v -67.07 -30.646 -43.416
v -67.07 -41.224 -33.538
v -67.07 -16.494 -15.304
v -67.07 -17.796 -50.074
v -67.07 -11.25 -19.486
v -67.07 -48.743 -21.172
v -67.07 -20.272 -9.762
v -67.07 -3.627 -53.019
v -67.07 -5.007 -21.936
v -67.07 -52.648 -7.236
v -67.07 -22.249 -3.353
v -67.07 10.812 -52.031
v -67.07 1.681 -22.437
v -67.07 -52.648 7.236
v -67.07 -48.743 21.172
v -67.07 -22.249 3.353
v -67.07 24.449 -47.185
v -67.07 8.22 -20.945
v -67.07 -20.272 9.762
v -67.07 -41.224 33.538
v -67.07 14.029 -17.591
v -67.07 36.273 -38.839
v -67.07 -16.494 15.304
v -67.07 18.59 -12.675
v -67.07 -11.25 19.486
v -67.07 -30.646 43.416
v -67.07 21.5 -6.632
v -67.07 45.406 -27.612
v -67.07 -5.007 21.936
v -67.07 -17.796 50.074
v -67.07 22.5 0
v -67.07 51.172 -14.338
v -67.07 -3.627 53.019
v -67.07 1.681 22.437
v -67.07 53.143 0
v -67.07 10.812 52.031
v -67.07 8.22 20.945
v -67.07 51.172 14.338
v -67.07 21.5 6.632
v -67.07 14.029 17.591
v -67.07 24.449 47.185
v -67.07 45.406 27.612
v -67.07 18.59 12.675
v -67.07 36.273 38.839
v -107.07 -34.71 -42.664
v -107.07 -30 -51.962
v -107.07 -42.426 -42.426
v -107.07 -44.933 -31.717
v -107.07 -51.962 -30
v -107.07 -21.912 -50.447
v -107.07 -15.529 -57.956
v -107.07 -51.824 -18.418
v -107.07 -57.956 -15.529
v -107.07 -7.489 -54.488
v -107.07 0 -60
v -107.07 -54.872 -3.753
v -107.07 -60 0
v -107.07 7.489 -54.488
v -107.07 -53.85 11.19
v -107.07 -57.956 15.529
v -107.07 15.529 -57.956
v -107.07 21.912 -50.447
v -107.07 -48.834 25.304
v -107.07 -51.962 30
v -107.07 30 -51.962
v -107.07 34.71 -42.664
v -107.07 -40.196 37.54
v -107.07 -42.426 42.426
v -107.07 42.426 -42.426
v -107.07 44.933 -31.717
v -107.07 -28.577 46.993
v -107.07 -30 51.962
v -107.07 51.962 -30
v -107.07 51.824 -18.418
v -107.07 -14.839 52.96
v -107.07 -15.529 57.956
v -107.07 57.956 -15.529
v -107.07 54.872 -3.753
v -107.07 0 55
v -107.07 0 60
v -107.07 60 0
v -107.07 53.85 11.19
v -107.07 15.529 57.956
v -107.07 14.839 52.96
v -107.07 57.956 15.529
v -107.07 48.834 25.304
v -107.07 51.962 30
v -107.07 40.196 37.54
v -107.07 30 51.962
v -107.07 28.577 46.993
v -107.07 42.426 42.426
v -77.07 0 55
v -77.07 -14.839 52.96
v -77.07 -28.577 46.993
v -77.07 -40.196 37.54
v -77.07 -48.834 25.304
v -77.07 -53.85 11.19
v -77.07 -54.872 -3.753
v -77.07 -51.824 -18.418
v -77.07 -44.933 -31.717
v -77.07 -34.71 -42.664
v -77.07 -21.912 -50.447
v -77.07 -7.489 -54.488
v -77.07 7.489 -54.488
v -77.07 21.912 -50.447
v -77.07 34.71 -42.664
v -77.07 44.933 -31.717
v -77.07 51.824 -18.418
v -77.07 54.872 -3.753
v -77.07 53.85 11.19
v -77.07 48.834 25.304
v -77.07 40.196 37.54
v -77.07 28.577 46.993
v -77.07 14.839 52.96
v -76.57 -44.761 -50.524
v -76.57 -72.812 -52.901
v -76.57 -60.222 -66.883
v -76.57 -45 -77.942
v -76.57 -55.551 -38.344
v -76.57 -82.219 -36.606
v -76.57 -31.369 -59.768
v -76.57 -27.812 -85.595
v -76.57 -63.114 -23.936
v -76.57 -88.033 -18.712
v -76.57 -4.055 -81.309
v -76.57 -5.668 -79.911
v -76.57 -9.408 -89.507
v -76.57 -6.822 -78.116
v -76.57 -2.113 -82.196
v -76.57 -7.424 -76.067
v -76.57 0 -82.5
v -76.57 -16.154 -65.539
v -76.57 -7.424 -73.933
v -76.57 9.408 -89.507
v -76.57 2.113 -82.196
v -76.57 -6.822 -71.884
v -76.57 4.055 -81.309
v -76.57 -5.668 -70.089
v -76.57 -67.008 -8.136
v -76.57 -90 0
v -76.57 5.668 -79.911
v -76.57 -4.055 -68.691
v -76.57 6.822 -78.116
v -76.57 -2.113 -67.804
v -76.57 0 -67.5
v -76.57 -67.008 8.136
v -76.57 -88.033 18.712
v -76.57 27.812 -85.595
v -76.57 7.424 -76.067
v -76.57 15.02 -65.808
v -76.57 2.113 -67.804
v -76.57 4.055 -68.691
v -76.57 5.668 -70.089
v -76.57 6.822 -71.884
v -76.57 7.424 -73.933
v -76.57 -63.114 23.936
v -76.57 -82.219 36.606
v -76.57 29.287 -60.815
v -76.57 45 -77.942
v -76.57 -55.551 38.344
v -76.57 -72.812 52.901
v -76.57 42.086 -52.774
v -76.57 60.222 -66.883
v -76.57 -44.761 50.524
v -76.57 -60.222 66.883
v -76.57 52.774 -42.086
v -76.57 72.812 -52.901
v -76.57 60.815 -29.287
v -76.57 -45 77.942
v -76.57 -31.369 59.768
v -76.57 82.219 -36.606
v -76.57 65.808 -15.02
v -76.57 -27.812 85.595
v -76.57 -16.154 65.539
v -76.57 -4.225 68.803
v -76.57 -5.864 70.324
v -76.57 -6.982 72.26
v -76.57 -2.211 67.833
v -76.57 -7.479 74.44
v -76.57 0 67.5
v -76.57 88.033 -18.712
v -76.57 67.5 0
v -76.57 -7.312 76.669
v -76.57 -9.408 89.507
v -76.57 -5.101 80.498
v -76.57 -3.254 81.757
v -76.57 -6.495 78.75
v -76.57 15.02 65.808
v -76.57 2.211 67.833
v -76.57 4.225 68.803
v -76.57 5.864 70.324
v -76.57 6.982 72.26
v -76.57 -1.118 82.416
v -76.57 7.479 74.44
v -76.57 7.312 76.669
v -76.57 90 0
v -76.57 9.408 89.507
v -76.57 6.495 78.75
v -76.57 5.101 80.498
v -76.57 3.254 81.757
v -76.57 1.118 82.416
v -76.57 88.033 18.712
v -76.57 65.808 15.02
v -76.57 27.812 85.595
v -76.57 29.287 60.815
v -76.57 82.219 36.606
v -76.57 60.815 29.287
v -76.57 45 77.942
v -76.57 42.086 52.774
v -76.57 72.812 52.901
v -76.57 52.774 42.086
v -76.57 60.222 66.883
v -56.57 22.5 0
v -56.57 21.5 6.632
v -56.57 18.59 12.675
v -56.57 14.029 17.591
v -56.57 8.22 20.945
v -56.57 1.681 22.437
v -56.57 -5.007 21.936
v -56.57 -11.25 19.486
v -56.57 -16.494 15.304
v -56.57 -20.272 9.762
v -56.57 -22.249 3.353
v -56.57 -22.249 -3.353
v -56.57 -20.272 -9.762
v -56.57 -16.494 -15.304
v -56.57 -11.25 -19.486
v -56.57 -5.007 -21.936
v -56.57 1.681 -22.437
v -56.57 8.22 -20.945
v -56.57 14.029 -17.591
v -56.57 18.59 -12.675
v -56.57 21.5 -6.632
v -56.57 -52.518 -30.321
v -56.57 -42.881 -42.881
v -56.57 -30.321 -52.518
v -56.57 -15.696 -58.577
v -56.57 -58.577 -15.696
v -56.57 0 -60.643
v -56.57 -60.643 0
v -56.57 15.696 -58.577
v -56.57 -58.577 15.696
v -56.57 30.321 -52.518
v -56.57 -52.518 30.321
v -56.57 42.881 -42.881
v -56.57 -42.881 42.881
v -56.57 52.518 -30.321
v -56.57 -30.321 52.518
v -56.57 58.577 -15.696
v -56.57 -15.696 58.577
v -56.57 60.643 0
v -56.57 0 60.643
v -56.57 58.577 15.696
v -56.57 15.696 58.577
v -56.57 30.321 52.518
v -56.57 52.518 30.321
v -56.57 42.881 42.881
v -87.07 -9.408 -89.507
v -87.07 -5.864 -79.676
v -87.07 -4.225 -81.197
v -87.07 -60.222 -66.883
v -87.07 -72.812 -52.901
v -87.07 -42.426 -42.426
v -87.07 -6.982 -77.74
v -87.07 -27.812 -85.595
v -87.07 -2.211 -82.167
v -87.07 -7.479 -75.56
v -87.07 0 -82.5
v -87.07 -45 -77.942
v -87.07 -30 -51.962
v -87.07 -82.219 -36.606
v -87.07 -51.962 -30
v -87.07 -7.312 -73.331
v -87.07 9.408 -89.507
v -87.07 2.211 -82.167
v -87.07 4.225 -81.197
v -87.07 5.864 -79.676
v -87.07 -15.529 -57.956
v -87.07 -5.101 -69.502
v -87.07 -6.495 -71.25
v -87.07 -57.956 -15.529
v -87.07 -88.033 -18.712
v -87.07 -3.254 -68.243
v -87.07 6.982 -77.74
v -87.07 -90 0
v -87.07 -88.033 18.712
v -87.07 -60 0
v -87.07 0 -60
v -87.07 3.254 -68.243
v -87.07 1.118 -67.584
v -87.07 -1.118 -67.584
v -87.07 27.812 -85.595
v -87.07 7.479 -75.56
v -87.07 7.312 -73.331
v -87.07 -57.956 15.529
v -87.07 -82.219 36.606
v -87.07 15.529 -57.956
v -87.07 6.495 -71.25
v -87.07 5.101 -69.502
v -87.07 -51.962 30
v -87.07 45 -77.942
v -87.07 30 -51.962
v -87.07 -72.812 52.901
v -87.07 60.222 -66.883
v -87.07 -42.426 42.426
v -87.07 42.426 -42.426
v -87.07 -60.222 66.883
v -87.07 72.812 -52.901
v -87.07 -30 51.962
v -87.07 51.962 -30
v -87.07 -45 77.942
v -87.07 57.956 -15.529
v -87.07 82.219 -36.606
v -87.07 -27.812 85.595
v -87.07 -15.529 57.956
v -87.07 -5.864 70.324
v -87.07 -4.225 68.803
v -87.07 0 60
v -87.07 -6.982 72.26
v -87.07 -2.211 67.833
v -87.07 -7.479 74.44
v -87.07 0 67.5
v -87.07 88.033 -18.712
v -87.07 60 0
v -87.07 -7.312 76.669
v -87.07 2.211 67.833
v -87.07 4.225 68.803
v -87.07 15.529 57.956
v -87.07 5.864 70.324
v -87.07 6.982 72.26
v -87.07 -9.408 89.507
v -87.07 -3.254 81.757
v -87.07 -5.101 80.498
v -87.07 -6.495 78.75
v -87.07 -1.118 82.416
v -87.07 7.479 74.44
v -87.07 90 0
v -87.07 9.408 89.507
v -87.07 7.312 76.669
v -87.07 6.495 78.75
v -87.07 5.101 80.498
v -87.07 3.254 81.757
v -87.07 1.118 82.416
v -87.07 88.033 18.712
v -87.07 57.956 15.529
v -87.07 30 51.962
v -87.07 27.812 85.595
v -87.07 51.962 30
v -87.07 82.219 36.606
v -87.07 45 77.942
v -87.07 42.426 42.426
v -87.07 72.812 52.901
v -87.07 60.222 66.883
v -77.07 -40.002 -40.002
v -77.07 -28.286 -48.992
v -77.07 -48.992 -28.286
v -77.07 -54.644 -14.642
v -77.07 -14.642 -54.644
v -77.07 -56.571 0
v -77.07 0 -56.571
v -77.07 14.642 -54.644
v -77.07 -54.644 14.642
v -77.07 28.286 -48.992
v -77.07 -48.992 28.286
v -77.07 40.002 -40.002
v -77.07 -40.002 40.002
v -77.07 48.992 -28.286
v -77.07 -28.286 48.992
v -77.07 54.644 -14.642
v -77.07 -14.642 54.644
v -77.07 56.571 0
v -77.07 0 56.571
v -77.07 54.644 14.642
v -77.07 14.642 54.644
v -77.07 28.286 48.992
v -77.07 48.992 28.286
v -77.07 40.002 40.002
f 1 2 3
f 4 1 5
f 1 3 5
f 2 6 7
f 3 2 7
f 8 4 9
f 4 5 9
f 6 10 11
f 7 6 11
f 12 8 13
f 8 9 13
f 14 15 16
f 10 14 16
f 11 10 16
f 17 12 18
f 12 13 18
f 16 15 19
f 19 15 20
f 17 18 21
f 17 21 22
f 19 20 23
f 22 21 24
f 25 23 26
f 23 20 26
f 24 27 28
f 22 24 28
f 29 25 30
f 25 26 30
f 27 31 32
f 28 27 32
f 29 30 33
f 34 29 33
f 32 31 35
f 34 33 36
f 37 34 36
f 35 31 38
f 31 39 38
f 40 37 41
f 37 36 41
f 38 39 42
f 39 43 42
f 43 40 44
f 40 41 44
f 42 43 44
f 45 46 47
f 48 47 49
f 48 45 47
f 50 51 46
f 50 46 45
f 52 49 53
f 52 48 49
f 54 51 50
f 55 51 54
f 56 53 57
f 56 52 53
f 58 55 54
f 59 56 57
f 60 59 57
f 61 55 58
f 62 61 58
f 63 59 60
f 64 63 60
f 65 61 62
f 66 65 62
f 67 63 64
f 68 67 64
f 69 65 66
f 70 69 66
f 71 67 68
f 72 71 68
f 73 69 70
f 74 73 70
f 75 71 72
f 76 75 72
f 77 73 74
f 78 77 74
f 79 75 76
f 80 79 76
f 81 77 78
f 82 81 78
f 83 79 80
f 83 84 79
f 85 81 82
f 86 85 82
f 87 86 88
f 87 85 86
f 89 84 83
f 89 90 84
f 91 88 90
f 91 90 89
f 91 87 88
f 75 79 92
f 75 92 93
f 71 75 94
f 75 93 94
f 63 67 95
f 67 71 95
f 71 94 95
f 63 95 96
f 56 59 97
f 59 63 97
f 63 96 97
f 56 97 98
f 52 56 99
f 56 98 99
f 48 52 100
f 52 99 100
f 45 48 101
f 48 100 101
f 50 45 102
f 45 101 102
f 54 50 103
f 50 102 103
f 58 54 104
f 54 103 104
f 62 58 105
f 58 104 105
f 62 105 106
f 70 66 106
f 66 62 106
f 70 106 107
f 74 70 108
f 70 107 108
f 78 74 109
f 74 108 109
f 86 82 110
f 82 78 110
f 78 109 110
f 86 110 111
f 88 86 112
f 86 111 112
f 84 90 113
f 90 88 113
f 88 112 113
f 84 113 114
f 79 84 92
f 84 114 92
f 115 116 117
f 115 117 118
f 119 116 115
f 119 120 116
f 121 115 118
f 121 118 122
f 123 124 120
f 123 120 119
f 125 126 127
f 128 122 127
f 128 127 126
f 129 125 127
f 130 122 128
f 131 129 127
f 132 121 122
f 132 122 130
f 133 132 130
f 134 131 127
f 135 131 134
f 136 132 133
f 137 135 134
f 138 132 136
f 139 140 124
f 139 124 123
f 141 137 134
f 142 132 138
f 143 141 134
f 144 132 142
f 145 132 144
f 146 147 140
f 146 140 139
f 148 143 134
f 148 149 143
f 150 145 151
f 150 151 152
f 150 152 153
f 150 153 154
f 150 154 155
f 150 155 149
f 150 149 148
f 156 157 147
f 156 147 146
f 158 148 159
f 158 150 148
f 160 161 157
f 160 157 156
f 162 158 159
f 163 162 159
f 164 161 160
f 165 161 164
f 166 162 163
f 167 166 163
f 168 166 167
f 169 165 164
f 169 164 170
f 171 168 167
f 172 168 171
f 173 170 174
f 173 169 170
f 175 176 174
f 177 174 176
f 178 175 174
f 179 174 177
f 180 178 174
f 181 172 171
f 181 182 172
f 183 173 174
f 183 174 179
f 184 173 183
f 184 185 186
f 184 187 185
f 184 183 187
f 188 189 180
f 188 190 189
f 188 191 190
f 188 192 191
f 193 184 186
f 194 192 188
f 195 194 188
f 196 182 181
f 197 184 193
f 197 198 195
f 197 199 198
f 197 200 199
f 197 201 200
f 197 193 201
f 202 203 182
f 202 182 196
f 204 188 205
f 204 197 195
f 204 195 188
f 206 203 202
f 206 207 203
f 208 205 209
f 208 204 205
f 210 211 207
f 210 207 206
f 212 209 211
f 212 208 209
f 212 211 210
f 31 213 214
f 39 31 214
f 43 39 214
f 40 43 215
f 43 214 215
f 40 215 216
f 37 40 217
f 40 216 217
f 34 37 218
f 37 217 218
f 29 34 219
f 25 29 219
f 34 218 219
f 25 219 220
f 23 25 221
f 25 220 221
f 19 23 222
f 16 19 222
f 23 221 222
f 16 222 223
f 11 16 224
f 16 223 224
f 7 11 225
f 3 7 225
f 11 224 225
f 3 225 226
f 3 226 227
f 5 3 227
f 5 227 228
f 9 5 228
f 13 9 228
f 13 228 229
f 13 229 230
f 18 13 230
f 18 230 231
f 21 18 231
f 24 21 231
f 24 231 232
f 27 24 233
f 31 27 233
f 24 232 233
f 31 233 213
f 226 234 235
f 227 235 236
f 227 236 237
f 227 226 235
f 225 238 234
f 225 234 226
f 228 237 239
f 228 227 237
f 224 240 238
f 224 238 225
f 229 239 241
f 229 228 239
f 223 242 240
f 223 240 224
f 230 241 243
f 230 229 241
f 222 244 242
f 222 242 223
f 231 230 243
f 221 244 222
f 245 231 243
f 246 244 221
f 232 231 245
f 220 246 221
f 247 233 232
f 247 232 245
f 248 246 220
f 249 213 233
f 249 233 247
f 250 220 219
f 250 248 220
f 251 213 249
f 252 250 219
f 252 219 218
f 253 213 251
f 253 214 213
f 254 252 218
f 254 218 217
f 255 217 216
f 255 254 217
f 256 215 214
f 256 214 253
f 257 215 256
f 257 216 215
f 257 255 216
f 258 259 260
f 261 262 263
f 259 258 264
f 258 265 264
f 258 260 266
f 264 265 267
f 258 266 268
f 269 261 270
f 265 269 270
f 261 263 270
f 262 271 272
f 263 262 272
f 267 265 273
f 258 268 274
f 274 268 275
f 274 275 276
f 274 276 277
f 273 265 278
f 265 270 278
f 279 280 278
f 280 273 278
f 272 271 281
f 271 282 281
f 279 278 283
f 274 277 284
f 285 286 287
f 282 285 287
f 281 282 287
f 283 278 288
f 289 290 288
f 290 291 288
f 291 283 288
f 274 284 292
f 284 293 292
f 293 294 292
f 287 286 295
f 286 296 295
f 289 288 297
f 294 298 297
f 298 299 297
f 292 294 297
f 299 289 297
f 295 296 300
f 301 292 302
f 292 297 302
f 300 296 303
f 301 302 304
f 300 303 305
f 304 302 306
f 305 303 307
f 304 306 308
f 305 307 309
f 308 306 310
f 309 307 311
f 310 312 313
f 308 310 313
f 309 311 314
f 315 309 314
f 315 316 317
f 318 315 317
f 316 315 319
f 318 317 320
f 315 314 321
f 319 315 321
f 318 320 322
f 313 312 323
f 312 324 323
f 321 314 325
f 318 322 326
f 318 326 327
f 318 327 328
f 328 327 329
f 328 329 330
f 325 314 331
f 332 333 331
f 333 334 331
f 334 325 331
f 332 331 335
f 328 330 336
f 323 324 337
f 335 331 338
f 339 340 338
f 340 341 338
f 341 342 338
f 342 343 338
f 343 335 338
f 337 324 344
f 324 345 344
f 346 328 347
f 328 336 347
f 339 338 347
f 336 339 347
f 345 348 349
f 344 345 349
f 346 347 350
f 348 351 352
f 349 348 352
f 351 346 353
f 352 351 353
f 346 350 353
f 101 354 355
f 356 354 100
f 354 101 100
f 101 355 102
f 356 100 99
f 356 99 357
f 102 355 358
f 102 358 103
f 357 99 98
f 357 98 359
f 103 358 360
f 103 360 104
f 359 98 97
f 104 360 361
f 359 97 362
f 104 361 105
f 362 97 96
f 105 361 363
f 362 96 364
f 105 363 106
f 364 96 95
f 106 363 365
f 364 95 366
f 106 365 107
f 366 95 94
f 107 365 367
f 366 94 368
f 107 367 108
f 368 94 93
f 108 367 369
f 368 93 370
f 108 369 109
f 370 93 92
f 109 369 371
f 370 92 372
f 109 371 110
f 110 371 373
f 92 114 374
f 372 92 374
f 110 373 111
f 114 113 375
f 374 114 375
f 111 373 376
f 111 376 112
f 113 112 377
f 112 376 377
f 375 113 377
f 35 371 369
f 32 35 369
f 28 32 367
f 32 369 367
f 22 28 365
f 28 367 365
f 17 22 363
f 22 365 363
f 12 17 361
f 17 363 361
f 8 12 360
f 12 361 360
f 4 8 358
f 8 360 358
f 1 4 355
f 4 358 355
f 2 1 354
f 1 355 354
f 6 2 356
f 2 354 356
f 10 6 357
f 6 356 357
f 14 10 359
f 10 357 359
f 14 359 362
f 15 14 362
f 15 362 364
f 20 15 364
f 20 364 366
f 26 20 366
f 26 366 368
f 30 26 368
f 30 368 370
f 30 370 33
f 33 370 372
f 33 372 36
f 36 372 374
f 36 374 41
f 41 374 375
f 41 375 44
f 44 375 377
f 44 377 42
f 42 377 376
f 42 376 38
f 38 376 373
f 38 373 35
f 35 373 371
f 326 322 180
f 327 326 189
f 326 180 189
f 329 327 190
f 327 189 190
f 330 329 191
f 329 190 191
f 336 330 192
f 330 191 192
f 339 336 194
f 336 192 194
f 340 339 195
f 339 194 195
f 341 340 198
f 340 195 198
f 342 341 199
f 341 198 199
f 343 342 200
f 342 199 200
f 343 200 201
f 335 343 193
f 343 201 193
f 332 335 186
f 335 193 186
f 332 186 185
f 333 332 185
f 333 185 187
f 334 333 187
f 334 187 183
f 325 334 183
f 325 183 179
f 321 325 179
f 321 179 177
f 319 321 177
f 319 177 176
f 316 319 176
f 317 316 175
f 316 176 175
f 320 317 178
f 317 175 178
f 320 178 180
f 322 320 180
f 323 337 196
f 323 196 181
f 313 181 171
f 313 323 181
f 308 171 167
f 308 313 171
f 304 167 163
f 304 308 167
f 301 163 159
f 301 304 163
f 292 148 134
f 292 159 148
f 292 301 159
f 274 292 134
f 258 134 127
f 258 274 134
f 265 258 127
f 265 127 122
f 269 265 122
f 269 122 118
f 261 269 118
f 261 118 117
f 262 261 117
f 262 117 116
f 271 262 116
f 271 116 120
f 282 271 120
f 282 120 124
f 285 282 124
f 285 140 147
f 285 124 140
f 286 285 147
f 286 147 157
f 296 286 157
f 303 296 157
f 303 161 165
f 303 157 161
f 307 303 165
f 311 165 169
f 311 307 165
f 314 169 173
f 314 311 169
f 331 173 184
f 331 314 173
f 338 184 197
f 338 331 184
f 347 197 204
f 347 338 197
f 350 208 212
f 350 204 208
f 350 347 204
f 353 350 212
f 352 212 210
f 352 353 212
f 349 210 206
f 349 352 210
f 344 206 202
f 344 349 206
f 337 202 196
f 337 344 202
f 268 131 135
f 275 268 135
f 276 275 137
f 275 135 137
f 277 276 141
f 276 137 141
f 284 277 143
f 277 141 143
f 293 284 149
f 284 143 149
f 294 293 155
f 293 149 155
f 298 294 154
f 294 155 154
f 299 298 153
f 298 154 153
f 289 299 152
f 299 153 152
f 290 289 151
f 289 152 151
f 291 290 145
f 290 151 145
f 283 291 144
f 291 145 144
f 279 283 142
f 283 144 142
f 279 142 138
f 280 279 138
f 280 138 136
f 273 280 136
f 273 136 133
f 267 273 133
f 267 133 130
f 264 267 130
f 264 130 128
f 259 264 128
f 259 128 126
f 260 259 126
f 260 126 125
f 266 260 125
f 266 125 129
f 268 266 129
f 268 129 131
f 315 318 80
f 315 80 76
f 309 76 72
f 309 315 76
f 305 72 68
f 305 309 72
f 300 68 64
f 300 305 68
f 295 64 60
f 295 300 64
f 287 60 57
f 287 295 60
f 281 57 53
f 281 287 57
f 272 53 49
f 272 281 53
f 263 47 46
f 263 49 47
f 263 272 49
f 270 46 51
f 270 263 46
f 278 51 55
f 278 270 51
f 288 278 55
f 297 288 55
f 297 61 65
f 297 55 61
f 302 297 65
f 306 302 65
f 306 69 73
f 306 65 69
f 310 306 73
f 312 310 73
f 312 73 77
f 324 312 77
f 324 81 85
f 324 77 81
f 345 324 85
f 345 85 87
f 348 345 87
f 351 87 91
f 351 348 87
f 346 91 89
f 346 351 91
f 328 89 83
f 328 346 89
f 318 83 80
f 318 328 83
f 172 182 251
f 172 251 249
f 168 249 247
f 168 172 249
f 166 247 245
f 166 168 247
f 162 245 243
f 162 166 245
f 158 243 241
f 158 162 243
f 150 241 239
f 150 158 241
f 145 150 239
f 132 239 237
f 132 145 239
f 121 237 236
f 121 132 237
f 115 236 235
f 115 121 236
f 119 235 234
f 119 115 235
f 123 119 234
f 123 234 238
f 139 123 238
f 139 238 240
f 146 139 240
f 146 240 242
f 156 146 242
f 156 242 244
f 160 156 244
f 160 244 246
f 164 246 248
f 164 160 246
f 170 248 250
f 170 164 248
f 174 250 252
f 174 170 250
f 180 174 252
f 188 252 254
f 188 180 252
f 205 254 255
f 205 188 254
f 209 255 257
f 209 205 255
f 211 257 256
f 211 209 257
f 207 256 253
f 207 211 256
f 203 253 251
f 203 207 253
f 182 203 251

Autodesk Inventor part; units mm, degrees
ref_plane "YZ Plane" through (0, 0, 0) normal (1, 0, 0) x (0, 1, 0)
ref_plane "XZ Plane" through (0, 0, 0) normal (0, 1, 0) x (-1, 0, 0)
ref_plane "XY Plane" through (0, 0, 0) normal (0, 0, 1) x (1, 0, 0)
sketch "Sketch1" plane through (0, 0, 0) normal (0, 0, 1) x (1, 0, 0)
  line L0 (-56.5702, 22.5) -> (-56.5702, 60.6429)
  line L1 (-56.5702, 60.6429) -> (-76.5702, 67.5)
  line L2 (-76.5702, 67.5) -> (-76.5702, 90)
  line L3 (-76.5702, 90) -> (-87.0702, 90)
  line L4 (-87.0702, 90) -> (-87.0702, 60)
  line L5 (-87.0702, 60) -> (-67.0702, 53.1429)
  line L6 (-67.0702, 53.1429) -> (-67.0702, 22.5)
  line L7 (-67.0702, 22.5) -> (-56.5702, 22.5)
  line L8 (-104.4843, 0) -> (17.414, 0) projected
  point P0 (0, 0)
  dimension "d11" = 22.5
  dimension "d12" = 90
  dimension "d13" = 60
  dimension "d17" = 20
  dimension "d18" = 56.5702
  dimension "d24" = 22.5
  dimension "d31" = 10.5
  dimension "d32" = 10.5
  dimension "d33" = 10.5
revolve "Revolution1" add sketch "Sketch1" angle 360 about axis through (-10, 0, 0) along (1, 0, 0)
sketch "Sketch2" plane through (-76.5702, 0, 0) normal (1, 0, 0) x (0, 0, -1)
  circle A0 centre (0, 0) radius 67.5 projected
  circle A1 centre (0, 0) radius 75 construction
  circle A2 centre (-75, 0) radius 7.5
  circle A3 centre (75, 0) radius 7.5
  dimension "d21" = 150
  dimension "d22" = 15
  dimension "d23" = 15
extrude "Extrusion1" cut sketch "Sketch2" against normal through all contours A2 | A3
sketch "Sketch3" plane through (-87.0702, 0, 0) normal (-1, 0, 0) x (0, 0, 1)
  circle A0 centre (0, 0) radius 60.6429 projected
  circle A1 centre (0, 0) radius 60
  circle A2 centre (0, 0) radius 55
  dimension "d27" = 120
  dimension "d28" = 110
extrude "Extrusion2" add sketch "Sketch3" along normal mid plane 20 contours A1
sketch "Sketch4" plane through (-97.0702, 0, 0) normal (-1, 0, 0) x (0, 0, 1)
  circle A0 centre (0, 0) radius 55
  circle A1 centre (0, 0) radius 60
  dimension "d34" = 110
  dimension "d35" = 120
extrude "Extrusion3" add sketch "Sketch4" along normal blind 10
properties part number "Cover"
